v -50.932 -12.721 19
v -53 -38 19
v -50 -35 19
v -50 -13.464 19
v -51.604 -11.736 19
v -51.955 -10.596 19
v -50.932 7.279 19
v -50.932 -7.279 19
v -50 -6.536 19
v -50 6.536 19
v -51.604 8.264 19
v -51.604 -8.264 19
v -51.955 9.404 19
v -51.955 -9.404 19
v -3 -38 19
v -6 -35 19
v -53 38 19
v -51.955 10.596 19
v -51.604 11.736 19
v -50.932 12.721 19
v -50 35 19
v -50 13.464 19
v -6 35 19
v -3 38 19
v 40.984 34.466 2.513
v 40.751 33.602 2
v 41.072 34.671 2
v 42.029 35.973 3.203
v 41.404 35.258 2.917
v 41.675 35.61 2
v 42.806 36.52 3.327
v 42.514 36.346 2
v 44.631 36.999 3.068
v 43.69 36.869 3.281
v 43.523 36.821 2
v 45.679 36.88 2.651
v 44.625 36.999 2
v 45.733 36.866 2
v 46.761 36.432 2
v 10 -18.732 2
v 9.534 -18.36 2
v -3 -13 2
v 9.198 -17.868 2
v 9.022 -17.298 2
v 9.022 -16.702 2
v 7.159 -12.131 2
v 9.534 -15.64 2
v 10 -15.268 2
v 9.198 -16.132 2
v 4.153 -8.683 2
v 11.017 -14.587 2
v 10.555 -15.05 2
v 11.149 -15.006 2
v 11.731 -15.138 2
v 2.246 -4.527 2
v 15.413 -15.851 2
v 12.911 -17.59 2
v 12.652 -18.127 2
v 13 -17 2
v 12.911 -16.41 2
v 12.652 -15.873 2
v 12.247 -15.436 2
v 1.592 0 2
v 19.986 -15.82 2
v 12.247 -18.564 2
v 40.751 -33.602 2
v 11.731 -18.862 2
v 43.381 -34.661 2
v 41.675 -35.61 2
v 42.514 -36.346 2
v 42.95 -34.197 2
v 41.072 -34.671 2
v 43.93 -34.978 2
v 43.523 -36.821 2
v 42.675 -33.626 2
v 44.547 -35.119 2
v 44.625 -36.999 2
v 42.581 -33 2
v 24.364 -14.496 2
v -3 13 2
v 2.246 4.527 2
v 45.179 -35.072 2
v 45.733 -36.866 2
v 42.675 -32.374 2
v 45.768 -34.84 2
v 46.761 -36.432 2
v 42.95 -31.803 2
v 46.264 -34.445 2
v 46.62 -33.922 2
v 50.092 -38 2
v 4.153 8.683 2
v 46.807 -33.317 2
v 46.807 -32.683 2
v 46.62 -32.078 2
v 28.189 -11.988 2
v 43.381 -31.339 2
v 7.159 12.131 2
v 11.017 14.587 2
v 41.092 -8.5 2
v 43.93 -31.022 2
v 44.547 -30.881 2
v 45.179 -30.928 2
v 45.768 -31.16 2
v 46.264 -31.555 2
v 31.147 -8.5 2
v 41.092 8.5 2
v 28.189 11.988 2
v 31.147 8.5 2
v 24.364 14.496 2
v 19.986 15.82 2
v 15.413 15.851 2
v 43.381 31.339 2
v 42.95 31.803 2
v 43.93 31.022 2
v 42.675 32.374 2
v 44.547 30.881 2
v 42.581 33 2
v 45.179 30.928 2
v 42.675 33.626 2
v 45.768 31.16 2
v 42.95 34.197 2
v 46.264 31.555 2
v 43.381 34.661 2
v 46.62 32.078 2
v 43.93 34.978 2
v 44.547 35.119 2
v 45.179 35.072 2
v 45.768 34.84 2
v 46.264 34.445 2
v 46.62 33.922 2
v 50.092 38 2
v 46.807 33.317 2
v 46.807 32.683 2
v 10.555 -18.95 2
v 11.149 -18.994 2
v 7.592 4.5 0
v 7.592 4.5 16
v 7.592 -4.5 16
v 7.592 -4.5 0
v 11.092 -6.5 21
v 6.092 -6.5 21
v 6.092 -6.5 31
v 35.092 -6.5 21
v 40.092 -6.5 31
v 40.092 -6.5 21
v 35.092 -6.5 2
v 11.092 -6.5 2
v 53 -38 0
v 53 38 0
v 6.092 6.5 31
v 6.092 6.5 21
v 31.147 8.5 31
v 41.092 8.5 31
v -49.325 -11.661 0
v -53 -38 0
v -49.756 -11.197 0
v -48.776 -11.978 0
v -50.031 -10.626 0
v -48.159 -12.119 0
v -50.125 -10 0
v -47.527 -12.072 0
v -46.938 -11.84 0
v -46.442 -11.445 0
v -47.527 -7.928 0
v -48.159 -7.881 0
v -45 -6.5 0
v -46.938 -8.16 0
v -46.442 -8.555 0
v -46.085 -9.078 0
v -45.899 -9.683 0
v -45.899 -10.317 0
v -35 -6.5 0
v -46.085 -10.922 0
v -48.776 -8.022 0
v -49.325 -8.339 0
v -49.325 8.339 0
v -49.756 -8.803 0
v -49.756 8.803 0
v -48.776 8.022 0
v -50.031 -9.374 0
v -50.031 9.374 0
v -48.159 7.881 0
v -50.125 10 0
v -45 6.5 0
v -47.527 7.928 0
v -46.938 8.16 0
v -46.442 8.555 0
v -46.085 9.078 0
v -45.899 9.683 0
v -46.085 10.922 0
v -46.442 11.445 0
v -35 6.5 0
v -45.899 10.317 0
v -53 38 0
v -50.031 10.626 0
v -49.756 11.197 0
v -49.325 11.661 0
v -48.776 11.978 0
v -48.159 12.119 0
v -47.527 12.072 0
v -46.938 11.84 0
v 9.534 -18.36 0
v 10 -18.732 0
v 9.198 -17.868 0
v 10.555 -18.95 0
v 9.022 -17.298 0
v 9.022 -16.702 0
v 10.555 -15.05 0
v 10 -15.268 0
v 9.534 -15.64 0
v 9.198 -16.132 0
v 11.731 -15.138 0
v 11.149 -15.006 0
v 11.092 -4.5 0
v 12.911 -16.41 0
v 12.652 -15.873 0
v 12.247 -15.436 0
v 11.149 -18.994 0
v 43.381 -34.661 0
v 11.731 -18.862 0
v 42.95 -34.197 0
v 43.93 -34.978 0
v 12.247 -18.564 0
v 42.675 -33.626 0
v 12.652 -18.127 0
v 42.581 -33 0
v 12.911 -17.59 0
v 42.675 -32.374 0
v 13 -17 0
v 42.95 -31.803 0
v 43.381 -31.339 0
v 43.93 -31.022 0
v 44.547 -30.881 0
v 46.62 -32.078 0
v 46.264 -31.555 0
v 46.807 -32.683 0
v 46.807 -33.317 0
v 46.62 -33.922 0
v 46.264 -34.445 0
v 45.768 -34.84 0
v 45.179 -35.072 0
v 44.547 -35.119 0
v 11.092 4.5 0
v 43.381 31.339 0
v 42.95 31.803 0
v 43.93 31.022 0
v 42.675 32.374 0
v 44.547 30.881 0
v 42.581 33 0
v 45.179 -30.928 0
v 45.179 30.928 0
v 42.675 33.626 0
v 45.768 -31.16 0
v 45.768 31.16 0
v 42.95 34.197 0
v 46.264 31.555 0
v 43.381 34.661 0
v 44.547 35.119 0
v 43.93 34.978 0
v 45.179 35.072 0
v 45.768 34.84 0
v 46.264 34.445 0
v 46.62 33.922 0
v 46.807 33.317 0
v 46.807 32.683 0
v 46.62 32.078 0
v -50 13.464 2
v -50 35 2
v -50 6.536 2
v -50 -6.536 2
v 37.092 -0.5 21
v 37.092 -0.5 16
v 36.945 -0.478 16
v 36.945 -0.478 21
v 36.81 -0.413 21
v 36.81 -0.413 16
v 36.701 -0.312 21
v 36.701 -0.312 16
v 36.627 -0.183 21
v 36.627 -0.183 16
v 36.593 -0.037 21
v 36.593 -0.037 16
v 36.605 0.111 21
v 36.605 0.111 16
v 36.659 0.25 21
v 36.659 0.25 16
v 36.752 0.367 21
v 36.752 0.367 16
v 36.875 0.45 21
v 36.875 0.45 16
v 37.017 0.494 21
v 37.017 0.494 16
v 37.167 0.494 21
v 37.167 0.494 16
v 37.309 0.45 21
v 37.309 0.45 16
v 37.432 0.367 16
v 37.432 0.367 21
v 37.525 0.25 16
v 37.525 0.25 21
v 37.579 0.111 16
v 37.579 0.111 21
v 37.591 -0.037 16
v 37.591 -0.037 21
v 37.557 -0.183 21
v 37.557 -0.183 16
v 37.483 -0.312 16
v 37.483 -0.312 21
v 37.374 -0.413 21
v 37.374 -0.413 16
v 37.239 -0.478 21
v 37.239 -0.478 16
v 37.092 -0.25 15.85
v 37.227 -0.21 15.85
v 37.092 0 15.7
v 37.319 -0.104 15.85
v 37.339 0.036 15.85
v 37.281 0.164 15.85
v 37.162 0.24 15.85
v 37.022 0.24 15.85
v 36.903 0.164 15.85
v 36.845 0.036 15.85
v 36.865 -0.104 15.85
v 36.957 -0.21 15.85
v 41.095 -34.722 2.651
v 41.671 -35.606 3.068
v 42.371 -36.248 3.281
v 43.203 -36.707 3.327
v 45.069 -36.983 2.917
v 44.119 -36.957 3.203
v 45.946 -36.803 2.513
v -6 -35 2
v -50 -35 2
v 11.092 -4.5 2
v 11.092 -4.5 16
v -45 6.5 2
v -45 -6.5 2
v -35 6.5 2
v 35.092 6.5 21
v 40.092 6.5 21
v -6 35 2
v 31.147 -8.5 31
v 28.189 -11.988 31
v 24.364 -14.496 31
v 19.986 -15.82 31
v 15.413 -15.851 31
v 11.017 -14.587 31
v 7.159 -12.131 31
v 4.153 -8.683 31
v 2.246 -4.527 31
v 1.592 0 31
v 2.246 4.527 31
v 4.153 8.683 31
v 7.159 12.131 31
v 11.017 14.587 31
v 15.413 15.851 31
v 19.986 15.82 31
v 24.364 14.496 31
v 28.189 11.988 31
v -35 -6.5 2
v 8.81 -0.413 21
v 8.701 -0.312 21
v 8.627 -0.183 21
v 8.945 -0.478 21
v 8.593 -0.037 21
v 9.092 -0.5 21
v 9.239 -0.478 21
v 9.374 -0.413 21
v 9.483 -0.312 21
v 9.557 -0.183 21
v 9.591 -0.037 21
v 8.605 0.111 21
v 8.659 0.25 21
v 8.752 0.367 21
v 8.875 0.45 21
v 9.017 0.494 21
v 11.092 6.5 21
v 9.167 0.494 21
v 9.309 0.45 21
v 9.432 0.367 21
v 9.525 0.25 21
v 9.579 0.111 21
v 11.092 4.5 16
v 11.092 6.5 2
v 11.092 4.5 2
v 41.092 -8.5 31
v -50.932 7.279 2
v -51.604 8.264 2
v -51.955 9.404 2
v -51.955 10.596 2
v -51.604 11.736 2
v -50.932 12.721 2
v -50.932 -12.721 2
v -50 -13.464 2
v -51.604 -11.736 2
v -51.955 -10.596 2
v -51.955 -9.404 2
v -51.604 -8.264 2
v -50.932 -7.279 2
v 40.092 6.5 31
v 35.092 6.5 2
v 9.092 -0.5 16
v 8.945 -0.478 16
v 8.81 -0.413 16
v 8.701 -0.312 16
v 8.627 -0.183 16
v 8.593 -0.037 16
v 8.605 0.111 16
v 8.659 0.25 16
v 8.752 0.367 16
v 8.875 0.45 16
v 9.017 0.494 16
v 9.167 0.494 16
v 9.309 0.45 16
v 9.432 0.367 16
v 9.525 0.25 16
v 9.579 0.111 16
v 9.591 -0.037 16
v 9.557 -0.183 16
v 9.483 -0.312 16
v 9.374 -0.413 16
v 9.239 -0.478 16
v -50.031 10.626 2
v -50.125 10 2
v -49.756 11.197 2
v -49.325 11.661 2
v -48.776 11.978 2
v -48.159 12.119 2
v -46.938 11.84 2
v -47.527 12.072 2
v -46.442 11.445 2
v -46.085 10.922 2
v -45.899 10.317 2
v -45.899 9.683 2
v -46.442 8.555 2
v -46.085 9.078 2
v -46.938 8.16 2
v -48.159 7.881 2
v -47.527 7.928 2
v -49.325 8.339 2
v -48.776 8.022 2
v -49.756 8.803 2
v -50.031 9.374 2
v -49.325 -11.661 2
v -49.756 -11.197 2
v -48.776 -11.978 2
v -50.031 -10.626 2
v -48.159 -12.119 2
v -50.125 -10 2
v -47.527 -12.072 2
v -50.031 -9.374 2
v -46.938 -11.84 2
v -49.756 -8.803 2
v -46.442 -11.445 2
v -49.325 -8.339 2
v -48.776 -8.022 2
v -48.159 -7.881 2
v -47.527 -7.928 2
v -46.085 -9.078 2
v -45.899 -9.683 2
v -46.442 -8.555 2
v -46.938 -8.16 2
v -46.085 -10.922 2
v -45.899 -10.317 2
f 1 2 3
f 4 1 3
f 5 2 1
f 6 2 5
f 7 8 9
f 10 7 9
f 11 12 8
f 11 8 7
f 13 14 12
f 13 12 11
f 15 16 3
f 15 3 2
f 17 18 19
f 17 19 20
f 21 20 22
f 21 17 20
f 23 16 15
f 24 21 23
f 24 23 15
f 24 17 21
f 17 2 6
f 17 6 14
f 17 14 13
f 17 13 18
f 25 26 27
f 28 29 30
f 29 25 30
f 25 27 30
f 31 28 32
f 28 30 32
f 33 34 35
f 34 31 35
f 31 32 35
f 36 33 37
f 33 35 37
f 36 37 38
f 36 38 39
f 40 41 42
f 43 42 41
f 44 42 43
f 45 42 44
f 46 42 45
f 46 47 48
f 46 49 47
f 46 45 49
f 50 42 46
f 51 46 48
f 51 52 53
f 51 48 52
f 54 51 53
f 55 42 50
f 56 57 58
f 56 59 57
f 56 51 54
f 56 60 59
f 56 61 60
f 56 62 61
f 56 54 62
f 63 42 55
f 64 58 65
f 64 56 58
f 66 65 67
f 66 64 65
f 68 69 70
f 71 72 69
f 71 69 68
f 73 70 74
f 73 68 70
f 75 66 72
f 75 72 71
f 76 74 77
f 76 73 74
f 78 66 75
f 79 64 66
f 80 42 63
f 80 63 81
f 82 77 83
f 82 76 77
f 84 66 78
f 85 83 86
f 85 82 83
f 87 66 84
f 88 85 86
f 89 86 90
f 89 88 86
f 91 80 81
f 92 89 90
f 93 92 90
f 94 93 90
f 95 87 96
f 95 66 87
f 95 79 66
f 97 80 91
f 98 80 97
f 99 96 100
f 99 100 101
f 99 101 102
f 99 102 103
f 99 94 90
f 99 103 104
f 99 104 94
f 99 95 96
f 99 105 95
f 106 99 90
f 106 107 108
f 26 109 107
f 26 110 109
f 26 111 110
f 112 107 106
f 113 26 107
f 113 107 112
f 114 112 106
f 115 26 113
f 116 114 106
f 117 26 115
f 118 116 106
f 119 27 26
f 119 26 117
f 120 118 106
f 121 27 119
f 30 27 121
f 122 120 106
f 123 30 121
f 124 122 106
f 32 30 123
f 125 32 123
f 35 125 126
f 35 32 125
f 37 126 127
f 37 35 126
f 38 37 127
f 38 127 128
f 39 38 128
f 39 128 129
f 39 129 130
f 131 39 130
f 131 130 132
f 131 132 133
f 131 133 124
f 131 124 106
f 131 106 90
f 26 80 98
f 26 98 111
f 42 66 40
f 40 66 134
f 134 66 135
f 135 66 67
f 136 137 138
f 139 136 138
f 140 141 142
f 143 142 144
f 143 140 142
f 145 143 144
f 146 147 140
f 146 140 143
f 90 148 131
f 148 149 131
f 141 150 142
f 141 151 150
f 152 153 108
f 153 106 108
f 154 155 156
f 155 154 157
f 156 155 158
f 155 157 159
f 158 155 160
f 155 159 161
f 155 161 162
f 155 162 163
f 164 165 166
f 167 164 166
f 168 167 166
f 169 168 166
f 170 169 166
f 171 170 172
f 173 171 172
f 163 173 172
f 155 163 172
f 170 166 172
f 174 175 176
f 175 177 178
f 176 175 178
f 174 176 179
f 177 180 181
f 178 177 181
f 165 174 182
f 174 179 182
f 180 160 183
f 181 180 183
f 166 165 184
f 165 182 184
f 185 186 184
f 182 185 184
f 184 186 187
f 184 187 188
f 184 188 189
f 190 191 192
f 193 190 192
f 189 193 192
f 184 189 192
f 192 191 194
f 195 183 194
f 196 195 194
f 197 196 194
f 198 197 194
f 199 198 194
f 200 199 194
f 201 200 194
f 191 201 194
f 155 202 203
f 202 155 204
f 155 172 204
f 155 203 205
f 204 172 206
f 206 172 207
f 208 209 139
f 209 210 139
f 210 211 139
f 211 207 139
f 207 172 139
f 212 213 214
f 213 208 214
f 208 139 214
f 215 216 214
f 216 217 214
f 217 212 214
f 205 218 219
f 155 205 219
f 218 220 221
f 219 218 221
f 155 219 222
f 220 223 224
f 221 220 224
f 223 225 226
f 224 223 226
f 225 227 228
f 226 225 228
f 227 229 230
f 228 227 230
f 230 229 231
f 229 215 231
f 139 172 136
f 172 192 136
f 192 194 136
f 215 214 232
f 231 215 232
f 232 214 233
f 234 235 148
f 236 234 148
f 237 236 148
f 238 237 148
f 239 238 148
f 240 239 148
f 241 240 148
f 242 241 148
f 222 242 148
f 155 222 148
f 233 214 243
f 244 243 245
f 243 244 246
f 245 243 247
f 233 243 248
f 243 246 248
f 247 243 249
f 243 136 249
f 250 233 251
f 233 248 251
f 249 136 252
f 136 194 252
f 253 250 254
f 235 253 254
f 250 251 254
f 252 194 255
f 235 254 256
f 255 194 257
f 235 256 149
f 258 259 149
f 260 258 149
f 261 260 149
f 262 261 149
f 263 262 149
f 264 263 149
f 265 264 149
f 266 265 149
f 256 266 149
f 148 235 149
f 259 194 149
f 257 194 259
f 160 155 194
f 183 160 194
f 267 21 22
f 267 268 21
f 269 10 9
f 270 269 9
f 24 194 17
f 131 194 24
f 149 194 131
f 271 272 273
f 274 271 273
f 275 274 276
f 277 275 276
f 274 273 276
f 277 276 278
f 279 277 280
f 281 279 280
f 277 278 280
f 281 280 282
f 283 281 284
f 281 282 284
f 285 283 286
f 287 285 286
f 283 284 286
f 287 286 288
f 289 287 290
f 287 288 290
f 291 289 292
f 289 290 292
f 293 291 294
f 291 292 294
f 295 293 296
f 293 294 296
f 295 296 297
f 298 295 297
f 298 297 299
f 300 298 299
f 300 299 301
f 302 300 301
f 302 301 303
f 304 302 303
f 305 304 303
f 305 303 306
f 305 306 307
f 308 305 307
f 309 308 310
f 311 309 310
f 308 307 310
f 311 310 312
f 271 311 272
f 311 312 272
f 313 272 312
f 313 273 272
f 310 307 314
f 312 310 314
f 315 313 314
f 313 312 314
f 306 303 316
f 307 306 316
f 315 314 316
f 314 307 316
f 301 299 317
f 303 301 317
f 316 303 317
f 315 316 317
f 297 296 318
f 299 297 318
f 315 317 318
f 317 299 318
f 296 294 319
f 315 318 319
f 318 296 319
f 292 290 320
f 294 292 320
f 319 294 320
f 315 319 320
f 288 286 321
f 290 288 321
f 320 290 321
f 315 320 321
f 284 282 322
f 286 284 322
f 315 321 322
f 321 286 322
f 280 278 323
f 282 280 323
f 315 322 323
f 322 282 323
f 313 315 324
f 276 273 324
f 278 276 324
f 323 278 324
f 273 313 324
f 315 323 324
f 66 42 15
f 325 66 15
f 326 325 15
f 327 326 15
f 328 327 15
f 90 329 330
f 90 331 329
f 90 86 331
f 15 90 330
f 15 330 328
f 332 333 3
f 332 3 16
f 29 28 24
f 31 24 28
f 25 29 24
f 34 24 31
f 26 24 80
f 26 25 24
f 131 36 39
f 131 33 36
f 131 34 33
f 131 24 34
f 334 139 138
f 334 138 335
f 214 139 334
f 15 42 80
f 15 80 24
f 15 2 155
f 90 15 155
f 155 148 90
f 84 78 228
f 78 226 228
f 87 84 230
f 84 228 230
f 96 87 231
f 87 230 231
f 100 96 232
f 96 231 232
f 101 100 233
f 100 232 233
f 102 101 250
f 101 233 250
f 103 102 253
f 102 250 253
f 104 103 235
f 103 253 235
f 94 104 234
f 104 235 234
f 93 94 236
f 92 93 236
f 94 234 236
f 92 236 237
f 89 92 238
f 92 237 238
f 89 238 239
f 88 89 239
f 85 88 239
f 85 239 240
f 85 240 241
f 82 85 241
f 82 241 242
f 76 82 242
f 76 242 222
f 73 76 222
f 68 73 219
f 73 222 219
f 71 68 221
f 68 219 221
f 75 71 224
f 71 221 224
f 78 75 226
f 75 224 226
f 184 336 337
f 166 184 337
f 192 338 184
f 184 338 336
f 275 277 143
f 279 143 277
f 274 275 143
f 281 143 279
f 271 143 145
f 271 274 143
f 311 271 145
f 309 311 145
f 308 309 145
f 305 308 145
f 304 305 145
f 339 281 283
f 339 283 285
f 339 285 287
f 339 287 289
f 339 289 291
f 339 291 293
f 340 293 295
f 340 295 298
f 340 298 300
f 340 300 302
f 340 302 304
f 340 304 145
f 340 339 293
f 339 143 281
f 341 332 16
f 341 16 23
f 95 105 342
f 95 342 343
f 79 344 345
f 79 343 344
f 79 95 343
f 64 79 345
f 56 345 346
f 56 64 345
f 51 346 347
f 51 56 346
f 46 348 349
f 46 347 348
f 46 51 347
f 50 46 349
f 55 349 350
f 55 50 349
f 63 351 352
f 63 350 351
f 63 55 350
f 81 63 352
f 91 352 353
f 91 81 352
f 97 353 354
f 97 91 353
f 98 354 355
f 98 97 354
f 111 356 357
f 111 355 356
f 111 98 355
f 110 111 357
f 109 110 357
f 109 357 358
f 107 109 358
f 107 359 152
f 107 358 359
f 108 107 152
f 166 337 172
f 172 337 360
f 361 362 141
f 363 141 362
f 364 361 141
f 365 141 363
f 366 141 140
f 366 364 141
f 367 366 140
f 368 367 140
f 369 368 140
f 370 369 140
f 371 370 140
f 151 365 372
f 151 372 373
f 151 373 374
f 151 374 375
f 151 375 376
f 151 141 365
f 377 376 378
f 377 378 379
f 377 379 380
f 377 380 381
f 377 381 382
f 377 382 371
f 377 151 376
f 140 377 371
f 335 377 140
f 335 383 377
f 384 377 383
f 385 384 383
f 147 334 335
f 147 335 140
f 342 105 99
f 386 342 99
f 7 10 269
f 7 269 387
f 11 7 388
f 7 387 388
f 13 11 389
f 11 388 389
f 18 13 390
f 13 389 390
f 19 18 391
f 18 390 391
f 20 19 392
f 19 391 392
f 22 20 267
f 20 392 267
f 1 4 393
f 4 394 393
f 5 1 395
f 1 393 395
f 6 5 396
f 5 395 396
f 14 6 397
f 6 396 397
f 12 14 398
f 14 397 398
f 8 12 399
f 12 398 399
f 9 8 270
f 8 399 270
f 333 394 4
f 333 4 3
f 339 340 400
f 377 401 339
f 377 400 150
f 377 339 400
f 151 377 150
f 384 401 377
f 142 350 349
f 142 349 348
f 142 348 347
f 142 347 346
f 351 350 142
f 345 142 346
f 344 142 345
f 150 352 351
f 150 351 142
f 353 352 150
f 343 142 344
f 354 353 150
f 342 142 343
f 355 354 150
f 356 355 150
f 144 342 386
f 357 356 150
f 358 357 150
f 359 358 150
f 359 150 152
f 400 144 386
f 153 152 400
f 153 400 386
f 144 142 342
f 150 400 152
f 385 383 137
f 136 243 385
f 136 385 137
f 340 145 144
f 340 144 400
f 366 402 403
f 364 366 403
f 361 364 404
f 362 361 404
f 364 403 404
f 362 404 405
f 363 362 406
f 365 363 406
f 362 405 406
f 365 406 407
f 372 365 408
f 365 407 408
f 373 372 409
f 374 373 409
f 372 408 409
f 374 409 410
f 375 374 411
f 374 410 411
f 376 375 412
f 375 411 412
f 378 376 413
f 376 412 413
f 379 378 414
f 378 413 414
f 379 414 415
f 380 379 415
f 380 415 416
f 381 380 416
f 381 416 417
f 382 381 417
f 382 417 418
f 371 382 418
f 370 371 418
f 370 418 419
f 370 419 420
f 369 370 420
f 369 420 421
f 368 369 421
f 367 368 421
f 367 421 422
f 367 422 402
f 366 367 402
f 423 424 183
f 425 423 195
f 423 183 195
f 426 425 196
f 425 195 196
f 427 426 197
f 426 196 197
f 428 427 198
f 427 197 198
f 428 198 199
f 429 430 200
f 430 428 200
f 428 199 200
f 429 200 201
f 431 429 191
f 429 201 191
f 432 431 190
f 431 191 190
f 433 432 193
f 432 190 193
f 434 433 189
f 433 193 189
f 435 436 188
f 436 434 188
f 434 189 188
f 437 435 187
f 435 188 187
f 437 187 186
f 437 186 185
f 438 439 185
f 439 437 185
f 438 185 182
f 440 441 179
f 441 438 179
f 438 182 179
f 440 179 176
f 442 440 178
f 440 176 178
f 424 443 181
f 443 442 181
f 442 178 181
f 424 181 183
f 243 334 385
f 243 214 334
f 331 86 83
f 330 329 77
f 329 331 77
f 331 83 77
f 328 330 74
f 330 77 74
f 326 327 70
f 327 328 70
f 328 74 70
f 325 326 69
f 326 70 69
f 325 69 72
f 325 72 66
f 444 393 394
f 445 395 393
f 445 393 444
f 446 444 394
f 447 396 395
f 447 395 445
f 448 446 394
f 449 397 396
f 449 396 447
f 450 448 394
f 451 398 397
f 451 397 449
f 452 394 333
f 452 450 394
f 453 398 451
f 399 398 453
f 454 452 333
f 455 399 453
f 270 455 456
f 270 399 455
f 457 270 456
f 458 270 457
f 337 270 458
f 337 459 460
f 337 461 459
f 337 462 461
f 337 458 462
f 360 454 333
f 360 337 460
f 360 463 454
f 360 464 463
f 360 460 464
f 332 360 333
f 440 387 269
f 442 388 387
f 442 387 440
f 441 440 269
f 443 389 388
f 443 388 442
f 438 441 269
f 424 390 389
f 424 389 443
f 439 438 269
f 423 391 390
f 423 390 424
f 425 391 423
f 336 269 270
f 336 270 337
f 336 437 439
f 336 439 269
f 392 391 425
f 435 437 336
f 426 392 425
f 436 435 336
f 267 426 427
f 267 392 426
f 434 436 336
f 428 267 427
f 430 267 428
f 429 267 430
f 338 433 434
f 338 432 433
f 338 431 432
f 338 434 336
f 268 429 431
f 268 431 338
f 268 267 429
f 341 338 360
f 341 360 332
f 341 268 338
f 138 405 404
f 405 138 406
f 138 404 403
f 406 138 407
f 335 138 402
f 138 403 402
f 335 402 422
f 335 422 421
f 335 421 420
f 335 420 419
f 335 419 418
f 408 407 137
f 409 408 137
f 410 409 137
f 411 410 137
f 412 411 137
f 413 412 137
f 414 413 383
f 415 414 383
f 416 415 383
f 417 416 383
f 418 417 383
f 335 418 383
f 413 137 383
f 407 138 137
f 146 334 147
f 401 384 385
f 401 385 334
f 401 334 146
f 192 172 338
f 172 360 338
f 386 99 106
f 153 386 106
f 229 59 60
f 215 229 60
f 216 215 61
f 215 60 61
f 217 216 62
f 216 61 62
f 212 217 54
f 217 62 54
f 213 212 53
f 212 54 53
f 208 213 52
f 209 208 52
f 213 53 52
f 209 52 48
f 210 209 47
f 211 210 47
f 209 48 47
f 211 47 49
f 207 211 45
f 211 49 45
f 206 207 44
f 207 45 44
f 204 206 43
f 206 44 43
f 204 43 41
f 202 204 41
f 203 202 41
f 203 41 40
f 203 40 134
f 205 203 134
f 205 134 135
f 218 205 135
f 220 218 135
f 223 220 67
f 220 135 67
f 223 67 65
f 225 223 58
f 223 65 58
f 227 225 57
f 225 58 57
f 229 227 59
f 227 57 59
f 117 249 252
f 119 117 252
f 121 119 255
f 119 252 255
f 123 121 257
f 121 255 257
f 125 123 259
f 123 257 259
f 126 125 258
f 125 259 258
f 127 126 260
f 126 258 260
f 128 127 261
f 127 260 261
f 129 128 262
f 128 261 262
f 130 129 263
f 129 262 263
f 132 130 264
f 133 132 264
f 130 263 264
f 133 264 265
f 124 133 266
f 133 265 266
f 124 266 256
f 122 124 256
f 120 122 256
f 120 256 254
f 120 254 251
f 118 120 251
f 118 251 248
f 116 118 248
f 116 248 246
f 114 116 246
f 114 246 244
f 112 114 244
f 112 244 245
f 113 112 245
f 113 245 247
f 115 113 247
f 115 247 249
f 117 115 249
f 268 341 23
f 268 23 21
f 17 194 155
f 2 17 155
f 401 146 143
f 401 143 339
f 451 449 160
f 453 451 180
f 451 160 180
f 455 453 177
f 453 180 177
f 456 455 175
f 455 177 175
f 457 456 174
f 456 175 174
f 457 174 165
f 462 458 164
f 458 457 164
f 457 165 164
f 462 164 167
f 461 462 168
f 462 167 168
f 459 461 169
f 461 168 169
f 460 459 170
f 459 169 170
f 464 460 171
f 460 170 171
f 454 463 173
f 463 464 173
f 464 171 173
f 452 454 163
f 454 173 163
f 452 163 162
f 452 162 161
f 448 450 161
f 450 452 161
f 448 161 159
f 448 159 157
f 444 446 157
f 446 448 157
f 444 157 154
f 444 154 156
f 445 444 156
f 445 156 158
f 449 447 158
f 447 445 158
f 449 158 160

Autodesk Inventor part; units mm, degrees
ref_plane "YZ Plane" through (0, 0, 0) normal (1, 0, 0) x (0, 1, 0)
ref_plane "XZ Plane" through (0, 0, 0) normal (0, 1, 0) x (-1, 0, 0)
sketch "Sketch1" plane through (0, 0, 0) normal (0, 0, 1) x (1, 0, 0)
  line L0 (47.7059, -35) -> (-50, -35) projected
  line L1 (-50, -35) -> (-50, 35) projected
  line L2 (-50, 35) -> (47.7059, 35) projected
  line L3 (47.7059, 35) -> (47.7059, -35) projected
  line L4 (53, -38) -> (53, 38) projected
  line L5 (53, 38) -> (-53, 38) projected
  line L6 (-53, 38) -> (-53, -38) projected
  line L7 (-53, -38) -> (53, -38) projected
  point P0 (0, 0)
extrude "Extrusion1" add sketch "Sketch1" along normal blind 2 contours L0 L1 L2 L3 | L7 L6 L5 L4
sketch "Sketch2" plane through (-53, 38, 0) normal (0, 1, 0) x (1, 0, 0)
  line L0 (106, 0) -> (130.7184, 17) projected
  line L1 (106, 0) -> (106, -2) projected
  line L2 (106, 0) -> (103.092, -2)
  line L3 (106, -2) -> (0, -2) projected
  line L4 (103.092, -2) -> (106, -2)
  point P0 (53, 0)
extrude "Extrusion2" cut sketch "Sketch2" against normal through all
sketch "Sketch3" plane through (0, 0, 2) normal (0, 0, 1) x (1, 0, 0)
  line L0 (50.092, -38) -> (50.092, 38) projected
  line L1 (50.092, 38) -> (-53, 38) projected
  line L2 (-53, 38) -> (-53, -38) projected
  line L3 (-53, -38) -> (50.092, -38) projected
  line L4 (-53, -38) -> (-3, -38)
  line L5 (-3, -38) -> (-3, 38)
  line L6 (-3, 38) -> (-53, 38)
  line L7 (-53, 38) -> (-53, -38)
  line L8 (-53, 38) -> (-53, -38) projected
  line L9 (-53, -38) -> (50.092, -38) projected
  line L10 (50.092, 38) -> (-53, 38) projected
  line L11 (-50, -35) -> (-6, -35)
  line L12 (-6, -35) -> (-6, 35)
  line L13 (-6, 35) -> (-50, 35)
  line L14 (-50, 35) -> (-50, -35)
  point P0 (0, 0)
  dimension "d4" = 50
  dimension "d5" = 3
  dimension "d6" = 3
  dimension "d7" = 3
  dimension "d8" = 3
extrude "Extrusion3" add sketch "Sketch3" along normal blind 17 contours L3 L2 L1 L5
sketch3d "3D Sketch1"
sketch "Sketch4" plane through (-3, -38, 2) normal (1, 0, 0) x (0, 0, -1)
  line L0 (0, 76) -> (0, 0) projected
  line L1 (0, 76) -> (-17, 76) projected
  line L2 (-17, 0) -> (-17, 76) projected
  line L3 (0, 0) -> (-17, 0) projected
  line L4 (-17, 0) -> (-17, 76) projected
  line L5 (-17, 0) -> (0, 25)
  line L6 (0, 3) -> (0, 73) projected
  line L7 (-17, 76) -> (0, 51)
  point P0 (2, 38)
  dimension "d11" = 25
  dimension "d12" = 25
loft "Loft1" add profiles "Sketch4" section 2 point at (50.092, -38, 2) contours L5 L0 L3
loft "Loft2" add profiles "Sketch4" section 2 point at (50.092, 38, 2) contours L0 L7 L1
sketch "Sketch6" plane through (0, 0, 2) normal (0, 0, 1) x (1, 0, 0)
  line L0 (11.092, -6.5) -> (35.092, -6.5)
  line L1 (35.092, -6.5) -> (35.092, 6.5)
  line L2 (35.092, 6.5) -> (11.092, 6.5)
  line L3 (11.092, 6.5) -> (11.092, -6.5)
  line L4 (50.092, -38) -> (50.092, 38) construction
  line L5 (50.092, 38) -> (35.092, 6.5) construction
  line L6 (50.092, -38) -> (35.092, -6.5) construction
  line L7 (11.092, -6.5) -> (35.092, 6.5) construction
  line L8 (11.092, 6.5) -> (35.092, -6.5) construction
  line L9 (5.092, -8.5) -> (41.092, -8.5)
  line L10 (41.092, -8.5) -> (41.092, 8.5)
  line L11 (41.092, 8.5) -> (5.092, 8.5)
  line L12 (5.092, 8.5) -> (5.092, -8.5)
  point P0 (0, 0)
  point P1 (23.092, 0)
  dimension "d25" = 24
  dimension "d26" = 13
  dimension "d27" = 15
  dimension "d31" = 6
  dimension "d32" = 6
  dimension "d33" = 2
  dimension "d34" = 2
extrude "Extrusion5" add sketch "Sketch6" along normal blind 19
sketch "Sketch7" plane through (0, 0, 2) normal (0, 0, 1) x (1, 0, 0)
  circle A0 centre (17.592, 0) radius 0.6 projected
  arc A1 (31.1474, 8.5) -> (31.1474, -8.5) centre (17.592, 0) ccw
  line L0 (31.1474, -8.5) -> (5.092, -8.5)
  line L1 (5.092, -8.5) -> (5.092, 8.5)
  line L2 (5.092, 8.5) -> (31.1474, 8.5)
  line L3 (5.092, -8.5) -> (5.092, 8.5) projected
  line L4 (41.092, -8.5) -> (5.092, -8.5) projected
  line L5 (5.092, 8.5) -> (41.092, 8.5) projected
  point P0 (0, 0)
  dimension "d35" = 32
extrude "Extrusion6" add sketch "Sketch7" along normal blind 19 contours L2 L1 L0 A1
sketch "Sketch8" plane through (0, 0, 21) normal (0, 0, 1) x (1, 0, 0)
  line L0 (6.592, -1.125) -> (6.592, -6.2) projected
  line L1 (6.592, 6.2) -> (6.592, 1.125) projected
  line L2 (11.092, 6.5) -> (35.092, 6.5) projected
  line L3 (35.092, -6.5) -> (11.092, -6.5) projected
  line L4 (39.592, 6.2) -> (39.592, 1.125) projected
  line L5 (39.592, -1.125) -> (39.592, -6.2) projected
  line L6 (6.092, -6.5) -> (40.092, -6.5)
  line L7 (40.092, -6.5) -> (40.092, 6.5)
  line L8 (40.092, 6.5) -> (6.092, 6.5)
  line L9 (6.092, 6.5) -> (6.092, -6.5)
  arc A0 (31.1474, 8.5) -> (31.1474, -8.5) centre (17.592, 0) ccw projected
  line L10 (31.1474, -8.5) -> (41.092, -8.5) projected
  line L11 (41.092, 8.5) -> (31.1474, 8.5) projected
  line L12 (41.092, -8.5) -> (41.092, 8.5) projected
  point P0 (0, 0)
  dimension "d38" = 0.5
  dimension "d39" = 0.5
ref_plane "Work Plane1" through (12.092, -5.5, 31) normal (0, 0, 1) x (1, 0, 0)
extrude "Extrusion7" add sketch "Sketch8" along normal up to surface (10 mm away)
sketch "Sketch9" plane through (0, 0, 21) normal (0, 0, 1) x (1, 0, 0)
  arc A0 (8.4305, -0.75) -> (8.4305, 0.75) centre (9.092, 0) ccw projected
  arc A1 (37.7534, 0.75) -> (37.7534, -0.75) centre (37.092, 0) ccw projected
  point P0 (0, 0)
hole "Hole1" at (9.092, 0, 21) at (37.092, 0, 21) direction (0, 0, -1) diameter 1 depth 5 tip angle 118
sketch "Sketch10" plane through (0, 0, 2) normal (0, 0, 1) x (1, 0, 0)
  line L0 (7.592, -4.5) -> (11.092, -4.5)
  line L1 (11.092, -4.5) -> (11.092, 4.5)
  line L2 (11.092, 4.5) -> (7.592, 4.5)
  line L3 (7.592, 4.5) -> (7.592, -4.5)
  line L4 (11.092, 6.5) -> (11.092, -6.5) projected
  line L5 (35.092, 6.5) -> (11.092, 6.5) construction
  line L6 (11.092, 6.5) -> (7.592, 4.5) construction
  line L7 (7.592, -4.5) -> (11.092, -6.5) construction
  point P0 (0, 0)
  dimension "d49" = 3.5
  dimension "d50" = 9
extrude "Extrusion8" cut sketch "Sketch10" along normal blind 14 and the other way blind 3
sketch "Sketch11" plane through (0, 0, 0) normal (0, 0, -1) x (-1, 0, 0)
  circle A0 centre (-44.7059, -33) radius 2.125 projected
  circle A1 centre (-44.7059, 33) radius 2.125 projected
  circle A2 centre (48, -10) radius 2.125 projected
  circle A3 centre (48, 10) radius 2.125 projected
  point P0 (0, 0)
extrude "Extrusion9" cut sketch "Sketch11" against normal through all
sketch "Sketch12" plane through (0, 0, 2) normal (0, 0, 1) x (1, 0, 0)
  circle A0 centre (44.7059, -33) radius 2.125 projected
  circle A1 centre (44.7059, 33) radius 2.125 projected
  arc A2 (-50, -10.7181) -> (-50, -9.2819) centre (-48, -10) ccw projected
  arc A3 (-50, 9.2819) -> (-50, 10.7181) centre (-48, 10) ccw projected
  circle A4 centre (44.7059, -33) radius 4
  circle A5 centre (44.7059, 33) radius 4
  circle A6 centre (-48, -10) radius 2.125 projected
  circle A7 centre (-48, -10) radius 4
  circle A8 centre (-48, 10) radius 2.125 projected
  circle A9 centre (-48, 10) radius 4
  point P0 (0, 0)
  dimension "d57" = 8
  dimension "d58" = 8
  dimension "d59" = 8
  dimension "d60" = 8
extrude "Extrusion10" cut sketch "Sketch12" along normal through all contours A0 | A1 | A6 A2 | A8 A3 | A4 | A5 | A7 | A9
sketch "Sketch15" plane through (0, 0, 2) normal (0, 0, 1) x (1, 0, 0)
  line L0 (-45, -6.5) -> (-35, -6.5)
  line L1 (-35, -6.5) -> (-35, 6.5)
  line L2 (-35, 6.5) -> (-45, 6.5)
  line L3 (-45, 6.5) -> (-45, -6.5)
  line L4 (-50, -35) -> (-50, -13.4641) construction
  line L5 (-50, -35) -> (-45, -6.5) construction
  line L6 (-50, 35) -> (-6, 35) construction
  line L7 (-45, 6.5) -> (-50, 35) construction
  line L8 (-50, -6.5359) -> (-50, 6.5359) construction
  circle A0 centre (11, -17) radius 2
  line L9 (-3, -38) -> (-3, 38) projected
  line L10 (-3, -38) -> (50.092, -38) projected
  point P0 (0, 0)
  dimension "d73" = 10
  dimension "d74" = 13
  dimension "d75" = 5
  dimension "d76" = 4
  dimension "d77" = 14
  dimension "d78" = 21
extrude "Extrusion12" cut sketch "Sketch15" against normal through all
equation "\"d6\" = d5"
equation "\"d7\" = d5"
equation "\"d8\" = d5"
equation "\"d12\" = d11"
equation "\"d32\" = d31"
equation "\"d34\" = d33"
equation "\"d39\" = d38"
properties part number "cover" material "Ogólne"
